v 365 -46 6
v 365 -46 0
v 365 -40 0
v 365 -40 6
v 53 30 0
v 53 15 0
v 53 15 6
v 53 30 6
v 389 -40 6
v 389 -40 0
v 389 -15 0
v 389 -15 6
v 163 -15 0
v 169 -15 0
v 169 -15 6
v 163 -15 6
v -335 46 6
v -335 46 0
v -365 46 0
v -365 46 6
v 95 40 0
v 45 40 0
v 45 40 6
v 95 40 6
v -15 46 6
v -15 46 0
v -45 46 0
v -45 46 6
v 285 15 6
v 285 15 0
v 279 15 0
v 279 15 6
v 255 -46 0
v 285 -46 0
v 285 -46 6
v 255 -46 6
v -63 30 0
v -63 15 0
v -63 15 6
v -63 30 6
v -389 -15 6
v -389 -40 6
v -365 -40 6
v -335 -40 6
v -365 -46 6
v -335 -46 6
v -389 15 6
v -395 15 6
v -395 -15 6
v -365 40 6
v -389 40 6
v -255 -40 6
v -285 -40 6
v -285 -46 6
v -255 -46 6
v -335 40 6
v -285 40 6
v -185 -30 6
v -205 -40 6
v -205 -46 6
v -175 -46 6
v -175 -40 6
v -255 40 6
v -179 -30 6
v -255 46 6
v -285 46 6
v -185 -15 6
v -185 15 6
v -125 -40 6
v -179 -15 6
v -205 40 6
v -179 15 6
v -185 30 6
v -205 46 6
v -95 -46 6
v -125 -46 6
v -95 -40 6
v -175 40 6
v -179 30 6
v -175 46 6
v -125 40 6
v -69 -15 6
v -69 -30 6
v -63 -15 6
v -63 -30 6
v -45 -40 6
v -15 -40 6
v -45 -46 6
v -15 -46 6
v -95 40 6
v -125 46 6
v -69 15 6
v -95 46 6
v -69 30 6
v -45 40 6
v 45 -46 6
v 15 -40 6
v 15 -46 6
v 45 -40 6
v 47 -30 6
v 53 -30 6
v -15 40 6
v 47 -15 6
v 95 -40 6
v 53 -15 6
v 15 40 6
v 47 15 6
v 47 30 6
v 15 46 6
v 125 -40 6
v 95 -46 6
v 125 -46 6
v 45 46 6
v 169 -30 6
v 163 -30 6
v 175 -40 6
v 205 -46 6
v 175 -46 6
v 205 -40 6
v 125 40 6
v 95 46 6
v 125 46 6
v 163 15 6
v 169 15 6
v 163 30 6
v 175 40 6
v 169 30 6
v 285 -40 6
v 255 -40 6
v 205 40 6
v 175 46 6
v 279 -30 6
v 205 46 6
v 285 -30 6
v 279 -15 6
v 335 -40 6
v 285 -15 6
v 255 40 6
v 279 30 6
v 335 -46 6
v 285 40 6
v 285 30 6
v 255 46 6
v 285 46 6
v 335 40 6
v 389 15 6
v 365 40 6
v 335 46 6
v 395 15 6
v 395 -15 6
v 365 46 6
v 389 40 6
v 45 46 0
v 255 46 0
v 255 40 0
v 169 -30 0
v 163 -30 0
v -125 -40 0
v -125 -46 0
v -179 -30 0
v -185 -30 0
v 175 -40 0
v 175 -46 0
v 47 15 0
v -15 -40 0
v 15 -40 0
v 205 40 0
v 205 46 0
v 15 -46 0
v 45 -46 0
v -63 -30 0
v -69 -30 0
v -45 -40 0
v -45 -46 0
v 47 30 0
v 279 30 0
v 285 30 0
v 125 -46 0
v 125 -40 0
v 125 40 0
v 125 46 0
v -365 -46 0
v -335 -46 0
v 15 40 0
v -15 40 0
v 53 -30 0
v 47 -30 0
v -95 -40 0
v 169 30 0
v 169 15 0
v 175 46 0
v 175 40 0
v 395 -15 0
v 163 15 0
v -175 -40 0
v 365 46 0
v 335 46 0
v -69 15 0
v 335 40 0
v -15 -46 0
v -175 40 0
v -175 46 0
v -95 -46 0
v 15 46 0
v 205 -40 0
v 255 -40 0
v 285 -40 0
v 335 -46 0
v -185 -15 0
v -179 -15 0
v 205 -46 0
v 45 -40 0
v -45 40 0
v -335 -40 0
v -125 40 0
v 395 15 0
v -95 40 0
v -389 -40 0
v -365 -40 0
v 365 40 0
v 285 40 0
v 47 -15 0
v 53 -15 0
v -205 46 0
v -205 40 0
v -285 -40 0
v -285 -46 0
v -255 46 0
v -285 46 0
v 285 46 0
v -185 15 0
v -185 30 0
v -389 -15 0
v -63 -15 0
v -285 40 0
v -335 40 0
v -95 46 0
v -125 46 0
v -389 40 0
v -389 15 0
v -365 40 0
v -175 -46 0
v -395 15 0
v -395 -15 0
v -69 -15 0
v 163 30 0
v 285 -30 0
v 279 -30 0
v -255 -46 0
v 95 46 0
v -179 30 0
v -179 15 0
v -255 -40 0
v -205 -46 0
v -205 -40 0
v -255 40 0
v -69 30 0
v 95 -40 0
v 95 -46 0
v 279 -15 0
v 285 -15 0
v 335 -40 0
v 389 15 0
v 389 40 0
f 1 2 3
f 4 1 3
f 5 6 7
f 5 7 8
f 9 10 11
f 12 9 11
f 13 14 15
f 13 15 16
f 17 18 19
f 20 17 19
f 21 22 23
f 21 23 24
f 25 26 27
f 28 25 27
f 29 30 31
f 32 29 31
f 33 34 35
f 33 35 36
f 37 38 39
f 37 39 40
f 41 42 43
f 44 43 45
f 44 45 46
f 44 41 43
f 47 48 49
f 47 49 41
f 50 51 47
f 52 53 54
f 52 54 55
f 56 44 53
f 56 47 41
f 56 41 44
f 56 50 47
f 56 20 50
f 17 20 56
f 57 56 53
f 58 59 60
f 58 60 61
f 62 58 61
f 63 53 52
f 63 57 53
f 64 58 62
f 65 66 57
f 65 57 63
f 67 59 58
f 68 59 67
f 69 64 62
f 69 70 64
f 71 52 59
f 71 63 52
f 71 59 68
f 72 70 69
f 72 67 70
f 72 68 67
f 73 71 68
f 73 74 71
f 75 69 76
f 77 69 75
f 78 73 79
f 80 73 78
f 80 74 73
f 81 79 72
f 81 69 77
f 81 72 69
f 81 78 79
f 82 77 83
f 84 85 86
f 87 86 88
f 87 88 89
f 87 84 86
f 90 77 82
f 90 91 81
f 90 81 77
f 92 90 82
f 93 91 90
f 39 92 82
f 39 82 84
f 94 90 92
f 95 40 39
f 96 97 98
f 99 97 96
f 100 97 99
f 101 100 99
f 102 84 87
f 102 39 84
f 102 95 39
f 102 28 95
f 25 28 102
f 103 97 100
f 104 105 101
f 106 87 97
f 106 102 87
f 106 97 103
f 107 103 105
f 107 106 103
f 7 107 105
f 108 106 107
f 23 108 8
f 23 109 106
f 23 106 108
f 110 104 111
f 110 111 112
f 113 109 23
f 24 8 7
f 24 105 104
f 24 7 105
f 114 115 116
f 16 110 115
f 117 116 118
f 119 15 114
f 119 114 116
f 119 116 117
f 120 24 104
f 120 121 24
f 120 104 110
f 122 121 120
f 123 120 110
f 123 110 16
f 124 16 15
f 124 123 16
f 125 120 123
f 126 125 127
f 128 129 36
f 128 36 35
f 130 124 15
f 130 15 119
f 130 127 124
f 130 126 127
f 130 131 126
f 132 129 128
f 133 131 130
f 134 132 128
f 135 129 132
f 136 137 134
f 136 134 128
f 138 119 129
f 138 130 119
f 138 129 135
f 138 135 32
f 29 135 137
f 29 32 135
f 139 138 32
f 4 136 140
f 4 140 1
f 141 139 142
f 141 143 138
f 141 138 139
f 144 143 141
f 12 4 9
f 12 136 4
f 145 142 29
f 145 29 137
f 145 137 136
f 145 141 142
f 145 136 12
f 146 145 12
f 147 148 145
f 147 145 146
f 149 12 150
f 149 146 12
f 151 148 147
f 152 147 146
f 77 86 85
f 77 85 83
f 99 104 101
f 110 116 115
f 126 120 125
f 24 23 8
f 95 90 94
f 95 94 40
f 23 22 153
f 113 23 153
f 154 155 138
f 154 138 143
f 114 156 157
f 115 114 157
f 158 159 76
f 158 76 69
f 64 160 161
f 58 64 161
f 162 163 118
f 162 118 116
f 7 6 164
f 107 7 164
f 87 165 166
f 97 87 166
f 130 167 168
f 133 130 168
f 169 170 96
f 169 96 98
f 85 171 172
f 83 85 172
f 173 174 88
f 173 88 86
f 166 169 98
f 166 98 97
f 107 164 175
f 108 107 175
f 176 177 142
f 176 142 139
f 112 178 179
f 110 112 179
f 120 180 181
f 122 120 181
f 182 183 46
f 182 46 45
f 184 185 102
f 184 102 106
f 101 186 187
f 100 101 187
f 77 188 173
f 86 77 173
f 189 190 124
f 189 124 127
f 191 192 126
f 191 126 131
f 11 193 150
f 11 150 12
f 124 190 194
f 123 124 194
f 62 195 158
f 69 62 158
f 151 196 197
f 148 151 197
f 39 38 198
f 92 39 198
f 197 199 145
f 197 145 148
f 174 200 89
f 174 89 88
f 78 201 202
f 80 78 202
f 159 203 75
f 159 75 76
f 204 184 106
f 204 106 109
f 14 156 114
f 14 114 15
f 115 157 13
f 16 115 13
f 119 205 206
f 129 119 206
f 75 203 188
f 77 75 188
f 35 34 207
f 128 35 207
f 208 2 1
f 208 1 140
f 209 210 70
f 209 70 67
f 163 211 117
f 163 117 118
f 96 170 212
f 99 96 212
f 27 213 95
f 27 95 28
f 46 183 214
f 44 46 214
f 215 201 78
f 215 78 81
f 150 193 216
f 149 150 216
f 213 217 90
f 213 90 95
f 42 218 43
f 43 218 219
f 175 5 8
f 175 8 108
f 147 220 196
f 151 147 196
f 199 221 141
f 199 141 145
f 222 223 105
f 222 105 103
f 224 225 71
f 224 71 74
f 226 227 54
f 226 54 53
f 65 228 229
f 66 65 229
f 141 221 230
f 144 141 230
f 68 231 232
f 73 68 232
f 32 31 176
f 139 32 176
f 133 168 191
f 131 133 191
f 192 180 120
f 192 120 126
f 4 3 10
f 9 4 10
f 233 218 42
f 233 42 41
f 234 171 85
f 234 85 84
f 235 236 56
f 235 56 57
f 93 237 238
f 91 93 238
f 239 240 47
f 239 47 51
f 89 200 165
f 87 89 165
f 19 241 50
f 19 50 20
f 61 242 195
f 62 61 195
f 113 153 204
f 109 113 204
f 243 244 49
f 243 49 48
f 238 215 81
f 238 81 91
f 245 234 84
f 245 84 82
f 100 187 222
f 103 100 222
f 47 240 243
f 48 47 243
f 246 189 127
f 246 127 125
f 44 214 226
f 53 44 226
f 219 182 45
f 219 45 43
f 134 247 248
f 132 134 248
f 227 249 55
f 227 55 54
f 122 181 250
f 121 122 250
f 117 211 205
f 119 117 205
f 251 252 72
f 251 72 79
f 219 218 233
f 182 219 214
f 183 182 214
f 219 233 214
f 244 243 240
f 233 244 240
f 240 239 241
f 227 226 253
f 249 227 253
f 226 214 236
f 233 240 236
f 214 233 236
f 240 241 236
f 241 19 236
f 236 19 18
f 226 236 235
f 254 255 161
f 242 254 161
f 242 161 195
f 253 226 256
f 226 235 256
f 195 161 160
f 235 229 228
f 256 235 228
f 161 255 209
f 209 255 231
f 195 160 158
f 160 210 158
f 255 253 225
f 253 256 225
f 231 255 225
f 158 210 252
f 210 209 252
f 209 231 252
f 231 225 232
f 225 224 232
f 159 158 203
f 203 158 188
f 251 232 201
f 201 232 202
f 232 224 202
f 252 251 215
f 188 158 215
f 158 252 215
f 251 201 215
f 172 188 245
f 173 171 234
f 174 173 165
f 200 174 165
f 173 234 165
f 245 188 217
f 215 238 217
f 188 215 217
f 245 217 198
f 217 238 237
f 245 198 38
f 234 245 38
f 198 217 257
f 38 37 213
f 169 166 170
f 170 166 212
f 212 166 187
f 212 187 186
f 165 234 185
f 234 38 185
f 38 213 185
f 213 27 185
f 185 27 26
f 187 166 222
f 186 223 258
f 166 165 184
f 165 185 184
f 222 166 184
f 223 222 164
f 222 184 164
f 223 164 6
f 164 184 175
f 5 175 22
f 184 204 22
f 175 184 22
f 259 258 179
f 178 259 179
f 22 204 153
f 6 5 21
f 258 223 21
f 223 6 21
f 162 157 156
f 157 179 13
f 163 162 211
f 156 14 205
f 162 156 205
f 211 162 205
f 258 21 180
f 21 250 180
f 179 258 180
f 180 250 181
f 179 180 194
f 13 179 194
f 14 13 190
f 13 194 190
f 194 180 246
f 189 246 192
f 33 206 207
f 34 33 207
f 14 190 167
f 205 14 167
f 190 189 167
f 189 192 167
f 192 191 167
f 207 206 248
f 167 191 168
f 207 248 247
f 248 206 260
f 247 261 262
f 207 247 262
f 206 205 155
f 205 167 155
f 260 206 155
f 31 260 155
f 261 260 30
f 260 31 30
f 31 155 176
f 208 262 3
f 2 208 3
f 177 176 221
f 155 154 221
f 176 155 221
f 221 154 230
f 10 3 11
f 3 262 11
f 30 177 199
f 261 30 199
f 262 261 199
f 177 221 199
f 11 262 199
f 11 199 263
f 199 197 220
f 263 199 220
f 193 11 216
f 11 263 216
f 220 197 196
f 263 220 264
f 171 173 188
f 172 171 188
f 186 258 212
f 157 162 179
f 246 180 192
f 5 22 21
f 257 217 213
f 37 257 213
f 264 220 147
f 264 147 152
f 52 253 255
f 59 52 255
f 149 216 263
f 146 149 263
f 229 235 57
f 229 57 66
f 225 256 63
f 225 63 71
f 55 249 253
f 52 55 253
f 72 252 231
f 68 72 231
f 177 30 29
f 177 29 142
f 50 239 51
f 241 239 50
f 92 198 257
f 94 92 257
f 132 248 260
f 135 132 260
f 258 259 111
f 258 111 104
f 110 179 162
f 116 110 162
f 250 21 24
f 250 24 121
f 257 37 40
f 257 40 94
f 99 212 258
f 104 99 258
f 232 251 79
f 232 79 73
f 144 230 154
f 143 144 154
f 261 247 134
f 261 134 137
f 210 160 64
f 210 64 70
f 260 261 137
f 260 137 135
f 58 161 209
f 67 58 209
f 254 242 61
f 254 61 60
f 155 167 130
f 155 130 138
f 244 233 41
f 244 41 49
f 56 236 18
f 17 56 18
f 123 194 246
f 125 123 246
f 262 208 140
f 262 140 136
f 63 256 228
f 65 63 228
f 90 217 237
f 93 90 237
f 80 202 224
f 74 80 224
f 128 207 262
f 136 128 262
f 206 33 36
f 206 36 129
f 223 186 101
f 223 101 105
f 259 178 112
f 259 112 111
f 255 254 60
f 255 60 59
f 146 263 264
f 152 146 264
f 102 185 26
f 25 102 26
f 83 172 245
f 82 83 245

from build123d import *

# Parameters (mm, degrees)
SKETCH1_W           = 790
SKETCH1_H           = 80
BOSS_EXTRUDE1_DEPTH = 6
SKETCH2_W           = 6
SKETCH2_H           = 25
SKETCH2_H_2         = 15
CUT_EXTRUDE1_DEPTH  = 6
SKETCH3_W           = 30
SKETCH3_H           = 6
BOSS_EXTRUDE2_DEPTH = 6


with BuildPart() as part:
    # Sketch1 → Boss-Extrude1 (new body)
    with BuildSketch(Plane.XY):
        Rectangle(SKETCH1_W, SKETCH1_H)
    extrude(amount=BOSS_EXTRUDE1_DEPTH)

    # Sketch2 → Cut-Extrude1 (cut)
    with BuildSketch(Plane(origin=(0, 0, 0), x_dir=(-1, 0, 0), z_dir=(0, 0, -1))):
        with Locations((392, 27.5)):
            Rectangle(SKETCH2_W, SKETCH2_H)
        with Locations((392, -27.5)):
            Rectangle(SKETCH2_W, SKETCH2_H)
        with Locations((-392, -27.5)):
            Rectangle(SKETCH2_W, SKETCH2_H)
        with Locations((-392, 27.5)):
            Rectangle(SKETCH2_W, SKETCH2_H)
        with Locations((66, -22.5)):
            Rectangle(SKETCH2_W, SKETCH2_H_2)
        with Locations((182, -22.5)):
            Rectangle(SKETCH2_W, SKETCH2_H_2)
        with Locations((182, 22.5)):
            Rectangle(SKETCH2_W, SKETCH2_H_2)
        with Locations((66, 22.5)):
            Rectangle(SKETCH2_W, SKETCH2_H_2)
        with Locations((-50, -22.5)):
            Rectangle(SKETCH2_W, SKETCH2_H_2)
        with Locations((-50, 22.5)):
            Rectangle(SKETCH2_W, SKETCH2_H_2)
        with Locations((-166, -22.5)):
            Rectangle(SKETCH2_W, SKETCH2_H_2)
        with Locations((-166, 22.5)):
            Rectangle(SKETCH2_W, SKETCH2_H_2)
        with Locations((-282, -22.5)):
            Rectangle(SKETCH2_W, SKETCH2_H_2)
        with Locations((-282, 22.5)):
            Rectangle(SKETCH2_W, SKETCH2_H_2)
    extrude(amount=-CUT_EXTRUDE1_DEPTH, mode=Mode.SUBTRACT)

    # Sketch3 → Boss-Extrude2 (add)
    with BuildSketch(Plane(origin=(0, 0, 0), x_dir=(-1, 0, 0), z_dir=(0, 0, -1))):
        with Locations((-30, -43)):
            Rectangle(SKETCH3_W, SKETCH3_H)
        with Locations((-30, 43)):
            Rectangle(SKETCH3_W, SKETCH3_H)
        with Locations((-110, -43)):
            Rectangle(SKETCH3_W, SKETCH3_H)
        with Locations((-110, 43)):
            Rectangle(SKETCH3_W, SKETCH3_H)
        with Locations((-190, -43)):
            Rectangle(SKETCH3_W, SKETCH3_H)
        with Locations((-190, 43)):
            Rectangle(SKETCH3_W, SKETCH3_H)
        with Locations((-270, -43)):
            Rectangle(SKETCH3_W, SKETCH3_H)
        with Locations((-270, 43)):
            Rectangle(SKETCH3_W, SKETCH3_H)
        with Locations((-350, -43)):
            Rectangle(SKETCH3_W, SKETCH3_H)
        with Locations((-350, 43)):
            Rectangle(SKETCH3_W, SKETCH3_H)
        with Locations((350, 43)):
            Rectangle(SKETCH3_W, SKETCH3_H)
        with Locations((350, -43)):
            Rectangle(SKETCH3_W, SKETCH3_H)
        with Locations((270, 43)):
            Rectangle(SKETCH3_W, SKETCH3_H)
        with Locations((270, -43)):
            Rectangle(SKETCH3_W, SKETCH3_H)
        with Locations((190, 43)):
            Rectangle(SKETCH3_W, SKETCH3_H)
        with Locations((190, -43)):
            Rectangle(SKETCH3_W, SKETCH3_H)
        with Locations((110, 43)):
            Rectangle(SKETCH3_W, SKETCH3_H)
        with Locations((110, -43)):
            Rectangle(SKETCH3_W, SKETCH3_H)
        with Locations((30, 43)):
            Rectangle(SKETCH3_W, SKETCH3_H)
        with Locations((30, -43)):
            Rectangle(SKETCH3_W, SKETCH3_H)
    extrude(amount=-BOSS_EXTRUDE2_DEPTH)


solid = part.part
